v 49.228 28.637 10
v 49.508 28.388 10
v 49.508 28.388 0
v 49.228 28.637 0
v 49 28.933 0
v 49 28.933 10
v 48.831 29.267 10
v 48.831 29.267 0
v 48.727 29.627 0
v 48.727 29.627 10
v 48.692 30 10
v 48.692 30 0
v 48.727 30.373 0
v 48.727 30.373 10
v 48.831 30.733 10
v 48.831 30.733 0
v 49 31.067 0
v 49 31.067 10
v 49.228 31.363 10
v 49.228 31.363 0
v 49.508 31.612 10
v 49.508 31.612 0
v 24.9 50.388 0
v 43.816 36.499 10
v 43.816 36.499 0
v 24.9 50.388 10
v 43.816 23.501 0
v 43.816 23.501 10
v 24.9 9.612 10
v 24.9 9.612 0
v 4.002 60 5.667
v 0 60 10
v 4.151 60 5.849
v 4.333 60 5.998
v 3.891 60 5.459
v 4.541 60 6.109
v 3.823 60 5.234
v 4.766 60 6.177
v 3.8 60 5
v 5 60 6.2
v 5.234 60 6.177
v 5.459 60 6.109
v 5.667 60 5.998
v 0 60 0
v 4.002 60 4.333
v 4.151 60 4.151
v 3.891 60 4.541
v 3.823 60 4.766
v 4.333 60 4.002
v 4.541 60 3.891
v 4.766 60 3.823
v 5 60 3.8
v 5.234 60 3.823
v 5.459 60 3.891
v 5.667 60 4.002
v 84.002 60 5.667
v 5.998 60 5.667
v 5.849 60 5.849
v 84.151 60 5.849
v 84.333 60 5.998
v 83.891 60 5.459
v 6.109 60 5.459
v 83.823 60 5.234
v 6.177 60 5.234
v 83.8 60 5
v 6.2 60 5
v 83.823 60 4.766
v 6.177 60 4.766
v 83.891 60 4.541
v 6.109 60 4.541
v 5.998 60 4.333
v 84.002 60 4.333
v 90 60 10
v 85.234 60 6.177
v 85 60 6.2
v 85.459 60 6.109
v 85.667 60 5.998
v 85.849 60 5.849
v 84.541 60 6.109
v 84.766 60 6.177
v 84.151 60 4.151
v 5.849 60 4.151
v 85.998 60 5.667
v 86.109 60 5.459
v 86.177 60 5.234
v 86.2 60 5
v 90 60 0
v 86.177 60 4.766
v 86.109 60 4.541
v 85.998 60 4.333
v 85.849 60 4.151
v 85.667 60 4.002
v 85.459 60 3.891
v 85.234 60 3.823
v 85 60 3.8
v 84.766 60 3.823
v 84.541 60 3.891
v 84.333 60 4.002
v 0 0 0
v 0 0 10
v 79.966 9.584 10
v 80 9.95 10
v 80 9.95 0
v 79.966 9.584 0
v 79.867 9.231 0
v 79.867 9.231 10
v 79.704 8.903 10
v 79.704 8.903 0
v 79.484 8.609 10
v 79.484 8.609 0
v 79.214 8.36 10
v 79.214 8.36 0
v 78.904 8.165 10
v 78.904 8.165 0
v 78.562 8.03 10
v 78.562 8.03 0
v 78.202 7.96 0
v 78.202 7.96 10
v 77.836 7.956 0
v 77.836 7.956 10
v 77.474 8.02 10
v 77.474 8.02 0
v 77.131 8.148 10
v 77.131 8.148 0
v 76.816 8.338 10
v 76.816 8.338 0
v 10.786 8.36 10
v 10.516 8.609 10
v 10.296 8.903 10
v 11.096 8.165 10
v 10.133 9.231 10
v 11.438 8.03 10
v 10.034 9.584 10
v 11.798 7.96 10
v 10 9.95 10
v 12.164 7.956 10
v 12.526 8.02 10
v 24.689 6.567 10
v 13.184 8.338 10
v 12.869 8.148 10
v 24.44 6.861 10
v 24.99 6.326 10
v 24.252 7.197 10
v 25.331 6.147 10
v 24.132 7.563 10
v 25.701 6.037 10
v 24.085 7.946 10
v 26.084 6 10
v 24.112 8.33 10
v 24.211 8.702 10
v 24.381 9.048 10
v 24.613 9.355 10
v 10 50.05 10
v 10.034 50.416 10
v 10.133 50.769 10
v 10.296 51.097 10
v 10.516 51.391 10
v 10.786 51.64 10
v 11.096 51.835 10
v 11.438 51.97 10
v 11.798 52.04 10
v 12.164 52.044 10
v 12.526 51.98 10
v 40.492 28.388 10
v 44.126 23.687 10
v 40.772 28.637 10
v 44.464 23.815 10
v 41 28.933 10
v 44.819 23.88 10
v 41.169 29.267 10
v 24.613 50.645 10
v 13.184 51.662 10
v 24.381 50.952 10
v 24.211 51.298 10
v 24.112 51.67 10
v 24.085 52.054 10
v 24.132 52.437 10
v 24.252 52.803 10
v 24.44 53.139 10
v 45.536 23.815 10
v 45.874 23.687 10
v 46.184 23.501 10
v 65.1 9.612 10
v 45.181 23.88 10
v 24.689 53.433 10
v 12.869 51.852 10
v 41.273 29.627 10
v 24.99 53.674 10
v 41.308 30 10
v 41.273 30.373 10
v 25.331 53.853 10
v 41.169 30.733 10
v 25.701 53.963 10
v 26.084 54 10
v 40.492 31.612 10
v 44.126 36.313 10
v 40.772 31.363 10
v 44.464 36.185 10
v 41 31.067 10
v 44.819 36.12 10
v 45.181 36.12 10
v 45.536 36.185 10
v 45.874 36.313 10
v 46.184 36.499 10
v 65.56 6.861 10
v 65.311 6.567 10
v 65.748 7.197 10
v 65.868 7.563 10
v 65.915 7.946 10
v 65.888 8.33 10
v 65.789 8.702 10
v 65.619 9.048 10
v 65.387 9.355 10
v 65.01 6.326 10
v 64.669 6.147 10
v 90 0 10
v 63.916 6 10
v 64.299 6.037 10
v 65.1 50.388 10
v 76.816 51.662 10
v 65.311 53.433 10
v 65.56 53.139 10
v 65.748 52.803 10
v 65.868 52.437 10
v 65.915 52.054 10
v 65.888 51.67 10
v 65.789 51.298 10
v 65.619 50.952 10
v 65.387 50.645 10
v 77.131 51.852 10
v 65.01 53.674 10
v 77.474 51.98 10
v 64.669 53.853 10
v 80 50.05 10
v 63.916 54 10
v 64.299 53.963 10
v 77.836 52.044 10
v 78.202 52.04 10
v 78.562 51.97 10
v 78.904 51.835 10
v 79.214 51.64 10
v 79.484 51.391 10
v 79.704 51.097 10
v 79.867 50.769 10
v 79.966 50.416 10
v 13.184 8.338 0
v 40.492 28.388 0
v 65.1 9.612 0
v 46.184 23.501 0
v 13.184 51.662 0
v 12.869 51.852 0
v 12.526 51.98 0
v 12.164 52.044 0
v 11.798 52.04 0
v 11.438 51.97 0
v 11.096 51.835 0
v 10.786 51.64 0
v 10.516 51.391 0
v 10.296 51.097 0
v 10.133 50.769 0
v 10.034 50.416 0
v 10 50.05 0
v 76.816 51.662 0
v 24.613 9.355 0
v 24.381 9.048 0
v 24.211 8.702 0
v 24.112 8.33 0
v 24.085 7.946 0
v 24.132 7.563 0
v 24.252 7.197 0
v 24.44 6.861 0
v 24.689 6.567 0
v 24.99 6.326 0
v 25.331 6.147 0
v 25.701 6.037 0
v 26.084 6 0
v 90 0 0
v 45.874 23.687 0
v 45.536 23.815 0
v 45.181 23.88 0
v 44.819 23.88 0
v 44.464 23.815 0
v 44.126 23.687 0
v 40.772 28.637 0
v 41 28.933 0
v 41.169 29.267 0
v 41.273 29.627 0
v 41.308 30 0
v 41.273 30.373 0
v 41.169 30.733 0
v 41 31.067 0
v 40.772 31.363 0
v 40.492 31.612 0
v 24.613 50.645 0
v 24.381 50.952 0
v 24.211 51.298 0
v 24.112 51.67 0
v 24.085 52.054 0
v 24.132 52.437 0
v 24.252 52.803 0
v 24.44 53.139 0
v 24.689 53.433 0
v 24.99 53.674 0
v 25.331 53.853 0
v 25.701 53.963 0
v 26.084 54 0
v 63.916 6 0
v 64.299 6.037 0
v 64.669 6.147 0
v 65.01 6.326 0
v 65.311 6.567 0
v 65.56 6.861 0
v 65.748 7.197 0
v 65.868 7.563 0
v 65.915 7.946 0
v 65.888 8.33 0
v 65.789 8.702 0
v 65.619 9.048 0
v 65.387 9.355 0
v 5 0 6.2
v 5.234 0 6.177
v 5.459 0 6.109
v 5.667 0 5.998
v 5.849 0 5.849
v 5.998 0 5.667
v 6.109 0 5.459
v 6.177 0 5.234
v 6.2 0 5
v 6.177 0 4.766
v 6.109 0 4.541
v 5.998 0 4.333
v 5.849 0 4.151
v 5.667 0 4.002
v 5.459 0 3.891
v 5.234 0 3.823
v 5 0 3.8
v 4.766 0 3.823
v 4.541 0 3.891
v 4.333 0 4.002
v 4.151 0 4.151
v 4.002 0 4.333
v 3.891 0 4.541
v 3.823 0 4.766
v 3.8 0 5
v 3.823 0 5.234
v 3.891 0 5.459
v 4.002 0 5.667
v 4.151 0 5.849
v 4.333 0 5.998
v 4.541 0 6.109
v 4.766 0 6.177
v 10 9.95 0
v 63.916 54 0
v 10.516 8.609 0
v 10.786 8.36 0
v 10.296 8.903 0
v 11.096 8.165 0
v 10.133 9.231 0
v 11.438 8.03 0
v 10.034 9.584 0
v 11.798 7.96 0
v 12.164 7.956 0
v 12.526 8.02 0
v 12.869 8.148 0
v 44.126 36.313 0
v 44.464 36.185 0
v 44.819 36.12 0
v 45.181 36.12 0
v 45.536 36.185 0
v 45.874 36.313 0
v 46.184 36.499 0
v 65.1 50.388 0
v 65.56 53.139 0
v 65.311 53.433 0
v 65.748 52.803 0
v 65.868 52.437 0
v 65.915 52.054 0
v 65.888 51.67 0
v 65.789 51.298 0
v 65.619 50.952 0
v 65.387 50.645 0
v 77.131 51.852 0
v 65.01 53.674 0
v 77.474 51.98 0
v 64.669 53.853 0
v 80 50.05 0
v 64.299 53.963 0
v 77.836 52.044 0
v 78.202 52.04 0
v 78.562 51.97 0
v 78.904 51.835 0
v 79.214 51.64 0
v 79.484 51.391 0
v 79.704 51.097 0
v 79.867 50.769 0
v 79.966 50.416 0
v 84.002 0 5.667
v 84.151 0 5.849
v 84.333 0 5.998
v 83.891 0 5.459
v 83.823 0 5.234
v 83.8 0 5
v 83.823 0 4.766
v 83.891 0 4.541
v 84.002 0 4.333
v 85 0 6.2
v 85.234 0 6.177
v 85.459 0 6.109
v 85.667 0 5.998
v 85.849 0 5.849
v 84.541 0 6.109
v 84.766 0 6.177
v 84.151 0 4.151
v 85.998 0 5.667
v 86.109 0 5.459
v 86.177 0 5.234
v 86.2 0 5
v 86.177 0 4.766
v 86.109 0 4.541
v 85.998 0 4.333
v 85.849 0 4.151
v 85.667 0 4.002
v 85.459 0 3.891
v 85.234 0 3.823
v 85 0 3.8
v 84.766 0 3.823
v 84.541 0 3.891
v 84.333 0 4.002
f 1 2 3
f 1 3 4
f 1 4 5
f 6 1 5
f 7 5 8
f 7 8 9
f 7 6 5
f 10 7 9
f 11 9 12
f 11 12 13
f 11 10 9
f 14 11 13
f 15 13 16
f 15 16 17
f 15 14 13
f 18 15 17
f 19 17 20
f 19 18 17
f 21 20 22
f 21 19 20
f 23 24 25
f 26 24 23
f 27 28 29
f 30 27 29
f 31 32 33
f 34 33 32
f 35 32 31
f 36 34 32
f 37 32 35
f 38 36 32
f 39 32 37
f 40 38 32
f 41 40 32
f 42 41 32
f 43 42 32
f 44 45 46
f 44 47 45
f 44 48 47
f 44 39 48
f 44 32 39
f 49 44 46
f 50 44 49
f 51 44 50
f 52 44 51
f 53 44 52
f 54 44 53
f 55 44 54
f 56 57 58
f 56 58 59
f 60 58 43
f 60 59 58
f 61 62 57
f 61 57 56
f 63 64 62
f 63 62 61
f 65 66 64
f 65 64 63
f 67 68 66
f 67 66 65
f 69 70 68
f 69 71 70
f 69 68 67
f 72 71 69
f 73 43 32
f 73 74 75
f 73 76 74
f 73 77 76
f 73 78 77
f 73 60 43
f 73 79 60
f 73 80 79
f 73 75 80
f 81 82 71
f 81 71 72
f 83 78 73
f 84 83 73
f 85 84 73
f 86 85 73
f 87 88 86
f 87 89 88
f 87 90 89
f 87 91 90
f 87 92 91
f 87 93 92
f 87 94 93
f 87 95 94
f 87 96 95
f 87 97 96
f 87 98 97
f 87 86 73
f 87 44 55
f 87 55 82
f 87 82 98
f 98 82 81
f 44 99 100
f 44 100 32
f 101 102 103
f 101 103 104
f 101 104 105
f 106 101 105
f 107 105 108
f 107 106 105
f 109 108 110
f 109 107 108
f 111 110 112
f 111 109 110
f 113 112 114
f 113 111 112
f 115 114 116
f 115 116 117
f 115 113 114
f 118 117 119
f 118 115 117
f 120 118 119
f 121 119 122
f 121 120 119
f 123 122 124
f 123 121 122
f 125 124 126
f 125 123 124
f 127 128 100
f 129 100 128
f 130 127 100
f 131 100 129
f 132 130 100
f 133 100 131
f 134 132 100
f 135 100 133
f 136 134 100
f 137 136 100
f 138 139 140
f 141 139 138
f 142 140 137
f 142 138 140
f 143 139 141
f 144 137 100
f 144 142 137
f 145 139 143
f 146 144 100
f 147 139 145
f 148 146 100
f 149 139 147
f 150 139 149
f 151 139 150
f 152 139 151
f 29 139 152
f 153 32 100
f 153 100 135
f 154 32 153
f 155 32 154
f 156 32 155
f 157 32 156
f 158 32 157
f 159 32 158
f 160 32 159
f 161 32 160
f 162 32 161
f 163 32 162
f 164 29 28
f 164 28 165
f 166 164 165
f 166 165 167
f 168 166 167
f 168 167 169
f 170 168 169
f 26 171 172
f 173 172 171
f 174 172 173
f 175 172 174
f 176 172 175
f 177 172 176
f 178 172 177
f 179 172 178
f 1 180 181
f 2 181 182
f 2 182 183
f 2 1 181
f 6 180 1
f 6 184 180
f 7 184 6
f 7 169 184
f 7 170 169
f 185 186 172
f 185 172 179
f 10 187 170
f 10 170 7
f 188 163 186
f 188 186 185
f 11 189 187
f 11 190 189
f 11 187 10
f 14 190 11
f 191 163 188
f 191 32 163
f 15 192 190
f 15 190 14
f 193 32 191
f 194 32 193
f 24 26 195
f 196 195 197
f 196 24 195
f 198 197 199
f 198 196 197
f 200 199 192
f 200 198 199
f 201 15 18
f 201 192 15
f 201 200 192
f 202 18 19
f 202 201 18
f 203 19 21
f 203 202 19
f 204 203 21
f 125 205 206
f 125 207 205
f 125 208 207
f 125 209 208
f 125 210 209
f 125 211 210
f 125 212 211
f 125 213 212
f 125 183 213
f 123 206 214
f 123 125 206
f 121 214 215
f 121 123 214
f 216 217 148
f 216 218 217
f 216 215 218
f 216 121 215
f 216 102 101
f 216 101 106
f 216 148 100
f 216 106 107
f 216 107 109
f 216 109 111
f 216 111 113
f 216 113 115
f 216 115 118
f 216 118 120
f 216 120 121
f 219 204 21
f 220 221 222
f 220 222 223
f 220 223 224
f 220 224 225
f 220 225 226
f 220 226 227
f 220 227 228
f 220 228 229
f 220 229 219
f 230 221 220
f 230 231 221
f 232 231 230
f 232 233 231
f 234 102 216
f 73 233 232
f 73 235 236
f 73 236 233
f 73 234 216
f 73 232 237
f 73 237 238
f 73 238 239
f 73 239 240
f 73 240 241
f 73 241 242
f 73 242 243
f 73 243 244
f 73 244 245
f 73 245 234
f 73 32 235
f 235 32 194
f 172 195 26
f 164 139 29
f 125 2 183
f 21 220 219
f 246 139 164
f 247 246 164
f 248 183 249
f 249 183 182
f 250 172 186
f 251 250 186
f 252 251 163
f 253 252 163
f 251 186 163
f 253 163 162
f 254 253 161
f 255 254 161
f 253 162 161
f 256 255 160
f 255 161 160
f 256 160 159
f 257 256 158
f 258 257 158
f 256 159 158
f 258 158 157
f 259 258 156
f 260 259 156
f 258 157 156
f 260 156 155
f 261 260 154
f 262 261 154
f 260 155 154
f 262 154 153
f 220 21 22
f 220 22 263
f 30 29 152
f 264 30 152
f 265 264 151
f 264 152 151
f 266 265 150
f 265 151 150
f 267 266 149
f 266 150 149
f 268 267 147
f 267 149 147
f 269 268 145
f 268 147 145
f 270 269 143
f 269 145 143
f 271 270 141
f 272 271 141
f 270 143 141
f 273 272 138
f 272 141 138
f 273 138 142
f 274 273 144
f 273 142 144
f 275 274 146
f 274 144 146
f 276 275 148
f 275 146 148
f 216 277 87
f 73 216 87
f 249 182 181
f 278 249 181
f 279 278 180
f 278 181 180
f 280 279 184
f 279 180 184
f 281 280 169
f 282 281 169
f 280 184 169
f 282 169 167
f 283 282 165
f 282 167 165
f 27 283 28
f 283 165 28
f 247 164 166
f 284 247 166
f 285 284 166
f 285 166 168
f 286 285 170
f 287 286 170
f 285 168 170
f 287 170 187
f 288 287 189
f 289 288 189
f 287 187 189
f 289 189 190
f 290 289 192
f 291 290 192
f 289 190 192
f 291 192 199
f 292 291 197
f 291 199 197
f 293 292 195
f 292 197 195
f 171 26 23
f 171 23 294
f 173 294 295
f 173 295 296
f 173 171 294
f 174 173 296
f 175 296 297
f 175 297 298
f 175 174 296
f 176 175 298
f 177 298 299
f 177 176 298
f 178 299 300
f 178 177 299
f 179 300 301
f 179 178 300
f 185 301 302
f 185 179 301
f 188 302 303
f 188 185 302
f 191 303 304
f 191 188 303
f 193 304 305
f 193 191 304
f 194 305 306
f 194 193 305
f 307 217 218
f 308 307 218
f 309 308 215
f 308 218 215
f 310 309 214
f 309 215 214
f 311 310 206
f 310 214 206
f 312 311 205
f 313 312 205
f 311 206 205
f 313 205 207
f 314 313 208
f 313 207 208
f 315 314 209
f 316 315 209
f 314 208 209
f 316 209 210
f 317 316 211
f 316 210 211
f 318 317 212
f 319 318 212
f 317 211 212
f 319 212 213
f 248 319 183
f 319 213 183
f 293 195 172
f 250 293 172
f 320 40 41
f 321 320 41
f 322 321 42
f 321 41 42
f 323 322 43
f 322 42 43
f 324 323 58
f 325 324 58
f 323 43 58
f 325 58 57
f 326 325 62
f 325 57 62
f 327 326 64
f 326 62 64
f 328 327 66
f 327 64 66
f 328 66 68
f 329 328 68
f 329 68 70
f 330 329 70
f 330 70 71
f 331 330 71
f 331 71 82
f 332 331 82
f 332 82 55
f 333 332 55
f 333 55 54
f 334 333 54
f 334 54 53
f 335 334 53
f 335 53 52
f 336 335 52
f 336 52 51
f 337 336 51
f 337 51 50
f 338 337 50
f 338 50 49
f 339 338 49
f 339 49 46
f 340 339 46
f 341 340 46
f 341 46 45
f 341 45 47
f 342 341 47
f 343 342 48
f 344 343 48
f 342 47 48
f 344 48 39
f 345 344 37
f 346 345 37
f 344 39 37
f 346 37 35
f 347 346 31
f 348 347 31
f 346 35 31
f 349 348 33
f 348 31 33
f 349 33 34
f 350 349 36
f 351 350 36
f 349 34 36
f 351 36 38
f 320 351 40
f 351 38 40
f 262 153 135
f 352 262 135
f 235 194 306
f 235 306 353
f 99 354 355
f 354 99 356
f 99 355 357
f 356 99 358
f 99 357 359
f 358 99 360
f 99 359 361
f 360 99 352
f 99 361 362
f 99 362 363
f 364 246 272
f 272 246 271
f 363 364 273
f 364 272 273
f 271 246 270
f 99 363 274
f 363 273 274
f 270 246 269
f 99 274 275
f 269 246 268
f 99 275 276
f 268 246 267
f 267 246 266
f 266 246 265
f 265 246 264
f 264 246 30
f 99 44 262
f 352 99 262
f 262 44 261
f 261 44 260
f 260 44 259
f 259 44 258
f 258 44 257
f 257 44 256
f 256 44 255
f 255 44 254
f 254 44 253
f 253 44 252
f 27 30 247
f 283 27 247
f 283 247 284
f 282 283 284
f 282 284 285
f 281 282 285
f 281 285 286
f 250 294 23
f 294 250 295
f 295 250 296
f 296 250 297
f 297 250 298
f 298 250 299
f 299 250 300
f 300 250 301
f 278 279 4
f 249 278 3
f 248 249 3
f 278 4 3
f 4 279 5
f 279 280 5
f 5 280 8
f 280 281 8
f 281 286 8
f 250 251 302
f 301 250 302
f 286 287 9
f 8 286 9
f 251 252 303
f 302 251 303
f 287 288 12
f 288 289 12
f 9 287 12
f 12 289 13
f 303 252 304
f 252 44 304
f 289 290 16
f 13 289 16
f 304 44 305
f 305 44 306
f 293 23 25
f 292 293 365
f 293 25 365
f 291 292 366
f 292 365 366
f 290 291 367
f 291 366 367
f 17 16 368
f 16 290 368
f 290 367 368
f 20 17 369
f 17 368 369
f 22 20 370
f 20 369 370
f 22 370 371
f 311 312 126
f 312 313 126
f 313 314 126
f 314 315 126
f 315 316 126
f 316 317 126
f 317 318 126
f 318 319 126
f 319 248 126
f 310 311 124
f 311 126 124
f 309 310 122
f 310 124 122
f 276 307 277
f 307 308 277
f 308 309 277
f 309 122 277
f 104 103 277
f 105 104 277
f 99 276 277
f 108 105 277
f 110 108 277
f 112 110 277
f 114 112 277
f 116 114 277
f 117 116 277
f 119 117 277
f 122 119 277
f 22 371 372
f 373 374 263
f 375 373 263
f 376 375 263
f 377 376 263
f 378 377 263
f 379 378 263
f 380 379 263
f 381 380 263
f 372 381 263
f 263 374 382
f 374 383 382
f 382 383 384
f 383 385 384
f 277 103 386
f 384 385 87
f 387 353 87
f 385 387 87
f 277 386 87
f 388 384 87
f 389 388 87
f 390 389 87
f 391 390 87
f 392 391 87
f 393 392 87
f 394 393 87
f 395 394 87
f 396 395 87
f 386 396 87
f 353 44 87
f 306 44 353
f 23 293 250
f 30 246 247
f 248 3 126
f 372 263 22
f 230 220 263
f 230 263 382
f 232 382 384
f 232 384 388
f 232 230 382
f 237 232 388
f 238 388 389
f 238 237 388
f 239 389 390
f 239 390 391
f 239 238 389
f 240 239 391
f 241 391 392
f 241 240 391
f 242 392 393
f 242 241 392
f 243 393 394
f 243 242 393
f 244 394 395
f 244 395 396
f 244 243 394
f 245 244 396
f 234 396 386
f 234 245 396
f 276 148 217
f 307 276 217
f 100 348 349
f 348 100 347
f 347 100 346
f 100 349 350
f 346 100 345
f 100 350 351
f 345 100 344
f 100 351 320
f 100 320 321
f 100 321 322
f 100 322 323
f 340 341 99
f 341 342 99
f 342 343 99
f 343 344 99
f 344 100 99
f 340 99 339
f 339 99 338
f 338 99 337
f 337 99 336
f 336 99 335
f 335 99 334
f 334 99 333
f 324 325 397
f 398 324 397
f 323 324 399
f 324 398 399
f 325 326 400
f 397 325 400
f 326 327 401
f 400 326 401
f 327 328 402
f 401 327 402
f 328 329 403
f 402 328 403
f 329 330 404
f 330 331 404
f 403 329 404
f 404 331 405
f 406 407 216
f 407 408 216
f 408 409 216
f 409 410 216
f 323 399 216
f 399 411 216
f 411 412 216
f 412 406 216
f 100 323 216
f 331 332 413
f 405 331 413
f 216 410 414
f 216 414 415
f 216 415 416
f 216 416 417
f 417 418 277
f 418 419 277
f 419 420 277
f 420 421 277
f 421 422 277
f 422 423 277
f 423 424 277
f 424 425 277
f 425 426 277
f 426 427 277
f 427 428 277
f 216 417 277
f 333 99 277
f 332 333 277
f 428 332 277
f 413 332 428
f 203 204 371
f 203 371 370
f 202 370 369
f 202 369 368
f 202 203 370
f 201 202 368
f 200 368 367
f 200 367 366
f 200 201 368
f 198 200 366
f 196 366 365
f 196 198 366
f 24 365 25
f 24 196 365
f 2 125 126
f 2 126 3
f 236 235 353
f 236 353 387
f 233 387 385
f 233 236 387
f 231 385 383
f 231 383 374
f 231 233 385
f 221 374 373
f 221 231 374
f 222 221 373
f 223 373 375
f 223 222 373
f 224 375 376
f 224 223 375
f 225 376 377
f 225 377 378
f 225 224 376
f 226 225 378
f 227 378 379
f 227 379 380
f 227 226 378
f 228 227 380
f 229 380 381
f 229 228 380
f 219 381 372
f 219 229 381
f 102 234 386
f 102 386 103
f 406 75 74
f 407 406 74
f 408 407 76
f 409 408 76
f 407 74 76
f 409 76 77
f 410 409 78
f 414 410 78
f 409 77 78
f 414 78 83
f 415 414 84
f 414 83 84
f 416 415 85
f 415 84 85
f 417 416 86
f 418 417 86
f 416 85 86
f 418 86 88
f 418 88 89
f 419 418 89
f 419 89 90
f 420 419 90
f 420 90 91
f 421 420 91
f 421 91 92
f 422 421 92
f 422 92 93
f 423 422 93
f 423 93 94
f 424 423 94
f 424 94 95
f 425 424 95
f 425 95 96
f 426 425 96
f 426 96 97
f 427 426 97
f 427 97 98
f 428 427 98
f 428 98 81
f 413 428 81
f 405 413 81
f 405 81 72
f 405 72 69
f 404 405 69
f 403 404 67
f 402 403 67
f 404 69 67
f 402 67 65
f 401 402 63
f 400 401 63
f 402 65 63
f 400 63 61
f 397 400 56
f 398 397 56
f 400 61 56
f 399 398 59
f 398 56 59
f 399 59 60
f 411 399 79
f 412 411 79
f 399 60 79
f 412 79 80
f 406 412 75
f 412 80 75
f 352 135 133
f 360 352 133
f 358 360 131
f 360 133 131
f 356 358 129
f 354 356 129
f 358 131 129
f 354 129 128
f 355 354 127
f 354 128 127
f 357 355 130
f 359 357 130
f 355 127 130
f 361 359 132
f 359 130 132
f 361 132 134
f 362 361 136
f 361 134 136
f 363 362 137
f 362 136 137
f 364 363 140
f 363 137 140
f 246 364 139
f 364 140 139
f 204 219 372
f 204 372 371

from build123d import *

# Parameters (mm, degrees)
SKIZZE1_W                       = 90
SKIZZE1_H                       = 60
AUFSATZ_LINEAR_AUSTRAGEN1_DEPTH = 10
SCHNITT_LINEAR_AUSTRAGEN1_DEPTH = 10
SKIZZE3_R                       = 1.2
SCHNITT_LINEAR_AUSTRAGEN2_DEPTH = 84


with BuildPart() as part:
    # Skizze1 → Aufsatz-Linear austragen1 (new body)
    with BuildSketch(Plane.XY):
        with Locations((45, 30)):
            Rectangle(SKIZZE1_W, SKIZZE1_H)
    extrude(amount=AUFSATZ_LINEAR_AUSTRAGEN1_DEPTH)

    # Skizze2 → Schnitt-Linear austragen1 (cut)
    with BuildSketch(Plane.XY.offset(10)):
        with BuildLine():
            Line((10, 50.05034464), (10, 9.94965536))
            ThreePointArc((10, 9.94965536), (11.096486968, 8.165372815), (13.183664201, 8.337532828))
            Line((13.183664201, 8.337532828), (40.491757454, 28.387877468))
            ThreePointArc((40.491757454, 28.387877468), (41.308093253, 30), (40.491757454, 31.612122532))
            Line((40.491757454, 31.612122532), (13.183664201, 51.662467172))
            ThreePointArc((13.183664201, 51.662467172), (11.096486968, 51.834627185), (10, 50.05034464))
        make_face()
        with BuildLine():
            Line((43.816335799, 36.499330073), (24.900464067, 50.387877468))
            ThreePointArc((24.900464067, 50.387877468), (24.183569789, 52.622798095), (26.084128268, 54))
            Line((26.084128268, 54), (63.915871732, 54))
            ThreePointArc((63.915871732, 54), (65.816430211, 52.622798095), (65.099535933, 50.387877468))
            Line((65.099535933, 50.387877468), (46.183664201, 36.499330073))
            ThreePointArc((46.183664201, 36.499330073), (45, 36.111452606), (43.816335799, 36.499330073))
        make_face()
        with BuildLine():
            Line((26.084128268, 6), (63.915871732, 6))
            ThreePointArc((63.915871732, 6), (65.816430211, 7.377201905), (65.099535933, 9.612122532))
            Line((65.099535933, 9.612122532), (46.183664201, 23.500669927))
            ThreePointArc((46.183664201, 23.500669927), (45, 23.888547394), (43.816335799, 23.500669927))
            Line((43.816335799, 23.500669927), (24.900464067, 9.612122532))
            ThreePointArc((24.900464067, 9.612122532), (24.183569789, 7.377201905), (26.084128268, 6))
        make_face()
        with BuildLine():
            Line((80, 50.05034464), (80, 9.94965536))
            ThreePointArc((80, 9.94965536), (78.903513032, 8.165372815), (76.816335799, 8.337532828))
            Line((76.816335799, 8.337532828), (49.508242546, 28.387877468))
            ThreePointArc((49.508242546, 28.387877468), (48.691906747, 30), (49.508242546, 31.612122532))
            Line((49.508242546, 31.612122532), (76.816335799, 51.662467172))
            ThreePointArc((76.816335799, 51.662467172), (78.903513032, 51.834627185), (80, 50.05034464))
        make_face()
    extrude(amount=-SCHNITT_LINEAR_AUSTRAGEN1_DEPTH, mode=Mode.SUBTRACT)

    # Skizze3 → Schnitt-Linear austragen2 (cut)
    with BuildSketch(Plane(origin=(0, 60, 0), x_dir=(1, 0, 0), z_dir=(0, 1, 0))):
        with Locations(Location((5, -5, 0), (0, 0, 270))):
            Circle(SKIZZE3_R)
        with Locations(Location((85, -5, 0), (0, 0, 270))):
            Circle(SKIZZE3_R)
    extrude(amount=-SCHNITT_LINEAR_AUSTRAGEN2_DEPTH, mode=Mode.SUBTRACT)


solid = part.part
